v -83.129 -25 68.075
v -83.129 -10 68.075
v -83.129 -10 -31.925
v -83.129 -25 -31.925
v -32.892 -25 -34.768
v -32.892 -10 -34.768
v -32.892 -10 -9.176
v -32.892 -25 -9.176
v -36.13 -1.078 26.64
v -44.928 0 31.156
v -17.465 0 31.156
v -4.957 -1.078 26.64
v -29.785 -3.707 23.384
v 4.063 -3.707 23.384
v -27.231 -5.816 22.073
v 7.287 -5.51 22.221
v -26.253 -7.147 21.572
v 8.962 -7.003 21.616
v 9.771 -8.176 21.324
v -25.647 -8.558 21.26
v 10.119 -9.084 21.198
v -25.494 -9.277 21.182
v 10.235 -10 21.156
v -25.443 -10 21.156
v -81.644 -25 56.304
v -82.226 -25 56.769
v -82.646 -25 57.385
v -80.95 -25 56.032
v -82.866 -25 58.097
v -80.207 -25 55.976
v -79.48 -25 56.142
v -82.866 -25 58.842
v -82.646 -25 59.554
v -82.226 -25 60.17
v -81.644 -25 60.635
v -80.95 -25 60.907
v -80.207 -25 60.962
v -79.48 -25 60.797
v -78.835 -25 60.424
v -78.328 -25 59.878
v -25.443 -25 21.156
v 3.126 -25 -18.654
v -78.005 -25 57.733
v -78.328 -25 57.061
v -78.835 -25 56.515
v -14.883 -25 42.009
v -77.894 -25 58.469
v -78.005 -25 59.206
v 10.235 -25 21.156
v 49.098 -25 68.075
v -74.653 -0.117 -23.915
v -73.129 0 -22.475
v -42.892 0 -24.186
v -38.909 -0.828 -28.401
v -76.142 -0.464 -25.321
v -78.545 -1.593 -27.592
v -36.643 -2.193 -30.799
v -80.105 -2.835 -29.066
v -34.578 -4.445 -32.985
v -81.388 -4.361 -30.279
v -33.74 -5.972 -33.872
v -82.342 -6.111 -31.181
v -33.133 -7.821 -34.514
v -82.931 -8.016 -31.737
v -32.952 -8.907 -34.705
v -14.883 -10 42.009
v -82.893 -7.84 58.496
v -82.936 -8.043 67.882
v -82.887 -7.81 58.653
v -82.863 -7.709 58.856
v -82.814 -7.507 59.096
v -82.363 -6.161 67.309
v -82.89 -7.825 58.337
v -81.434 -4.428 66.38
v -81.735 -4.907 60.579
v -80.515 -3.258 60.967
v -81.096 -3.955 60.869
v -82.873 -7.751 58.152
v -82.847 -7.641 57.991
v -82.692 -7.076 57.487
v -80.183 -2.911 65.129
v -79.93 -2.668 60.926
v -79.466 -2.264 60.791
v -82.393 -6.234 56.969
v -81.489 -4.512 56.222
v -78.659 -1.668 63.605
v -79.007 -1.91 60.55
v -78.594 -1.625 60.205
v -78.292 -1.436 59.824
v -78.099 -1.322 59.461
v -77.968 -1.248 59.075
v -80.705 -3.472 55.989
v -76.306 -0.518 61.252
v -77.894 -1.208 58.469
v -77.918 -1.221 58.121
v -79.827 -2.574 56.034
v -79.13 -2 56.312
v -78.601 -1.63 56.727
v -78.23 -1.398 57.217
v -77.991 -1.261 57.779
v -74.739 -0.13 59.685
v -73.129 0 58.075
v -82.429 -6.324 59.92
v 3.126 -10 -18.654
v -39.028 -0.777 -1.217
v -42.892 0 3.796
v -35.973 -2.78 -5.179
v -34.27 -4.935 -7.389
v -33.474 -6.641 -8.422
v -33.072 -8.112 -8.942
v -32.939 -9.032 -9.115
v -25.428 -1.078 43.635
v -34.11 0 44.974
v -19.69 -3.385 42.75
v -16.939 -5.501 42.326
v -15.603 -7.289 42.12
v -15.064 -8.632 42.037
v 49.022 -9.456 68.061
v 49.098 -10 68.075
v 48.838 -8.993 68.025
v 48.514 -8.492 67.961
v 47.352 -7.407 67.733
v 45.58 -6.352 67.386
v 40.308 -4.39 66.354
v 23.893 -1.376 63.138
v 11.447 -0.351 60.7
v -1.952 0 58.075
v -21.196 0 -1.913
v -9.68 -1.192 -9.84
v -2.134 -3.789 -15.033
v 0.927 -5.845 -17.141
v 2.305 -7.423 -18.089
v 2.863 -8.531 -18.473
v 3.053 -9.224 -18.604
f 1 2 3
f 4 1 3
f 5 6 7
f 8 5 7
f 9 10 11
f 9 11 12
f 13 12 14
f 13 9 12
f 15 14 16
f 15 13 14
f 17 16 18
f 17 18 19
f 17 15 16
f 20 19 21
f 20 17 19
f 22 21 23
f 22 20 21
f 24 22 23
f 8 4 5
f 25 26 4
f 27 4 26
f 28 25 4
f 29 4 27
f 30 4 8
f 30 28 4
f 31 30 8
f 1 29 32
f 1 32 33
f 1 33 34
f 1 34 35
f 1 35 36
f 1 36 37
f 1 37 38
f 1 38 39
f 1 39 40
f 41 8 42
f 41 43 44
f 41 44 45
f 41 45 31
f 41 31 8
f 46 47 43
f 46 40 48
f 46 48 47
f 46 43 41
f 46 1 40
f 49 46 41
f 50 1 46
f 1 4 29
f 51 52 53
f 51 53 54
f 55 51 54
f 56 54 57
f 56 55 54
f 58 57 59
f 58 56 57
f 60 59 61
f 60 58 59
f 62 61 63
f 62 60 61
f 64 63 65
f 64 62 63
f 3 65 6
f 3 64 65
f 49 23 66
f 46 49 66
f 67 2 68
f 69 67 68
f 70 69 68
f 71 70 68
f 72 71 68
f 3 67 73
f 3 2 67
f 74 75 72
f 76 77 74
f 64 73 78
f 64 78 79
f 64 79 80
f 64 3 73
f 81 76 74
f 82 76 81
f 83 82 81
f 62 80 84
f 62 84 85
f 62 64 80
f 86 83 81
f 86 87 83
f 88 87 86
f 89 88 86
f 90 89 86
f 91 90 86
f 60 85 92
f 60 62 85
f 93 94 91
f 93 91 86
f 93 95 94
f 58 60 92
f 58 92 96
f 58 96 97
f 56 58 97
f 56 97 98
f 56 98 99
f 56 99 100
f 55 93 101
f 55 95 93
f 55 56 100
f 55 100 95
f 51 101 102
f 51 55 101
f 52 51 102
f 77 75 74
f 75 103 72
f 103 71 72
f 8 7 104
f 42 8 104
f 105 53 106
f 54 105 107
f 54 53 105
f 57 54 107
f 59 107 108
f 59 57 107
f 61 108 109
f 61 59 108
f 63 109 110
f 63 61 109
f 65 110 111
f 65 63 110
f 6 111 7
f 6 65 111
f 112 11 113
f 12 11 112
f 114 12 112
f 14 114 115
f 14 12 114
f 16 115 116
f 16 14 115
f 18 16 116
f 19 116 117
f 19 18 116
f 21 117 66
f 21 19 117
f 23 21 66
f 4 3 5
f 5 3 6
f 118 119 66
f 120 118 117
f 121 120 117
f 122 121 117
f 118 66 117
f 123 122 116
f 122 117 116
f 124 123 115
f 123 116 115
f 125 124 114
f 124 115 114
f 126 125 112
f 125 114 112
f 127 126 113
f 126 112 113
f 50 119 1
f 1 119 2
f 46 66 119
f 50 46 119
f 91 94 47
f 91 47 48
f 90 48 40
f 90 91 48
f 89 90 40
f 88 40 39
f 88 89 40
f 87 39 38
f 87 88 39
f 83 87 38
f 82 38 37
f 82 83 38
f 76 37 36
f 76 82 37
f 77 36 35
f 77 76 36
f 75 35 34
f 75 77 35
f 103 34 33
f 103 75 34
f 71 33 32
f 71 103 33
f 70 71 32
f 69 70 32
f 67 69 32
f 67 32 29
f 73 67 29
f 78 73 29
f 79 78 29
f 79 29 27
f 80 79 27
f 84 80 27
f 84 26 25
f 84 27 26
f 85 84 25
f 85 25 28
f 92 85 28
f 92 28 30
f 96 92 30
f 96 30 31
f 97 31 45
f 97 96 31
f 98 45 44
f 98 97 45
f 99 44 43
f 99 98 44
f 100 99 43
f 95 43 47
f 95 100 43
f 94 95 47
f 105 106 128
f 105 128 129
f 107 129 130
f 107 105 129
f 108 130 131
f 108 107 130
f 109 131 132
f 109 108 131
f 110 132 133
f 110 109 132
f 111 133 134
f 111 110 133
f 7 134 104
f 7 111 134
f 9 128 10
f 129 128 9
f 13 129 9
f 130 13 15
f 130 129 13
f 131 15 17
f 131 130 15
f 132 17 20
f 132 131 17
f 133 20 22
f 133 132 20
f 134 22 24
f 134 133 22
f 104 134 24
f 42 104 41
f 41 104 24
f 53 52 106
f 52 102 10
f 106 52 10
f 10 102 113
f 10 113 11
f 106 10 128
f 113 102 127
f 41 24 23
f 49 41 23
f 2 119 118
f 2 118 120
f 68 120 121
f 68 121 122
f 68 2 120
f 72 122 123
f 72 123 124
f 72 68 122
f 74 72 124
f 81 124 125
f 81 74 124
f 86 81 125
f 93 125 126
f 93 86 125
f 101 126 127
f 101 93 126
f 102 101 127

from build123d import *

# Parameters (mm, degrees)
F1_DEPTH     = 25
F2_R         = 2.5
F3_DEPTH     = 46.9
F4_T1_DEPTH  = 150
F4_T3_DEPTH  = 182.2274848408
F4_T5_DEPTH  = 100.3173754326
F4_T10_DEPTH = 75.5924176596
F4_T15_DEPTH = 87.245278787
F4_T20_DEPTH = 99.0010747165
F4_T25_DEPTH = 85.6788355908
F4_T30_DEPTH = 82.646426835
F4_T35_DEPTH = 119.0871070802
F4_T41_DEPTH = 75.5924176596
F4_T45_DEPTH = 87.245278787
F4_T52_DEPTH = 85.6788355908
F4_T56_DEPTH = 99.0010747165
F4_T63_DEPTH = 119.0871070802
F4_T67_DEPTH = 82.646426835


# Not quite as in the source:
# - a fillet or chamfer that OpenCascade refuses, or shapes differently, is made with other operations: its cross-section is extruded or revolved along the edge and cut away or added


with BuildPart() as f1:
    # F0 (on Front) → F1 (new body)
    with BuildSketch(Plane.XZ):
        Polygon((49.0980417262, 68.0754659733), (-83.1294431146, 68.0754659733), (-83.1294431146, -31.9245340267), (-32.8924826343, -34.7681359889), (-32.8924826343, -9.1757183293), (3.1264783981, -18.6543911301), (-25.4433550304, 21.1560339021), (10.2354805604, 21.1560339021), (-14.8830008989, 42.00911699), align=None)
    extrude(amount=F1_DEPTH)

    # F2 (on Front) → F3 (cut)
    with BuildSketch(Plane.XZ):
        with Locations((-80.3935006261, 58.4694631398)):
            Circle(F2_R)
    extrude(amount=F3_DEPTH, mode=Mode.SUBTRACT)

    # F4: fillet of radius 10 on 9 edges, made by hand

    # F4_s2 → F4_t1 (cut)
    with BuildSketch(Plane.XY.offset(-56.9245340267)):
        with BuildLine():
            ThreePointArc((-83.1294431146, -10), (-80.2005109264, -2.9289321881), (-73.1294431146, 0))
            Line((-73.1294431146, 0), (-83.1294431146, 0))
            Line((-83.1294431146, 0), (-83.1294431146, -10))
        make_face()
    extrude(amount=F4_T1_DEPTH, mode=Mode.SUBTRACT)

    # F4_s4 → F4_t3 (cut)
    with BuildSketch(Plane.YZ.offset(-108.1294431146)):
        with BuildLine():
            ThreePointArc((-10, 68.0754659733), (-2.9289321881, 65.1465337851), (0, 58.0754659733))
            Line((0, 58.0754659733), (0, 68.0754659733))
            Line((0, 68.0754659733), (-10, 68.0754659733))
        make_face()
    extrude(amount=F4_T3_DEPTH, mode=Mode.SUBTRACT)

    # F4_s6 → F4_t5 (cut)
    with BuildSketch(Plane(origin=(-106.0227160465, 0, 6.0012867121), x_dir=(0, 1, 0), z_dir=(0.9984018453, 0, -0.0565133205))):
        with BuildLine():
            ThreePointArc((0, -26.5714345391), (-2.9289321881, -33.6425023509), (-10, -36.5714345391))
            Line((-10, -36.5714345391), (0, -36.5714345391))
            Line((0, -36.5714345391), (0, -26.5714345391))
        make_face()
    extrude(amount=F4_T5_DEPTH, mode=Mode.SUBTRACT)


with BuildPart() as f4_tool8:
    # F4_s9 → F4_t10 (new body)
    with BuildSketch(Plane.XY.offset(-59.7681359889)):
        with BuildLine():
            ThreePointArc((-42.8924826343, 0), (-35.8214148224, -2.9289321881), (-32.8924826343, -10))
            Line((-32.8924826343, -10), (-32.8924826343, 0))
            Line((-32.8924826343, 0), (-42.8924826343, 0))
        make_face()
    extrude(amount=F4_T10_DEPTH)

    split(bisect_by=Plane(origin=(-4.3886140602, 0, -16.676735461), x_dir=(0, 1, 0), z_dir=(-0.2544932703, 0, -0.9670745449)), keep=Keep.TOP)


with BuildPart() as f1_1:
    add(f1.part)

    # F4_t7: cut F4_tool8
    add(f4_tool8.part, mode=Mode.SUBTRACT)


with BuildPart() as f4_tool13:
    # F4_s14 → F4_t15 (new body)
    with BuildSketch(Plane(origin=(-52.6807321964, 0, 13.8633488887), x_dir=(0, 1, 0), z_dir=(0.9670745449, 0, -0.2544932703))):
        with BuildLine():
            ThreePointArc((0, -7.2445191005), (-2.9289321881, -14.3155869123), (-10, -17.2445191005))
            Line((-10, -17.2445191005), (0, -17.2445191005))
            Line((0, -17.2445191005), (0, -7.2445191005))
        make_face()
    extrude(amount=F4_T15_DEPTH)

    split(bisect_by=Plane.YZ.offset(-32.8924826343), keep=Keep.TOP)


with BuildPart() as f1_2:
    add(f1_1.part)

    # F4_t12: cut F4_tool13
    add(f4_tool13.part, mode=Mode.SUBTRACT)


with BuildPart() as f4_tool18:
    # F4_s19 → F4_t20 (new body)
    with BuildSketch(Plane(origin=(24.4753258646, 0, -34.1049634717), x_dir=(0, 1, 0), z_dir=(-0.5830450371, 0, 0.8124398345))):
        with BuildLine():
            ThreePointArc((0, 18.3362745772), (-2.9289321881, 11.2652067653), (-10, 8.3362745772))
            Line((-10, 8.3362745772), (0, 8.3362745772))
            Line((0, 8.3362745772), (0, 18.3362745772))
        make_face()
    extrude(amount=F4_T20_DEPTH)

    split(bisect_by=Plane.XY.offset(21.1560339021), keep=Keep.BOTTOM)


with BuildPart() as f1_3:
    add(f1_2.part)

    # F4_t17: cut F4_tool18
    add(f4_tool18.part, mode=Mode.SUBTRACT)


with BuildPart() as f4_tool23:
    # F4_s24 → F4_t25 (new body)
    with BuildSketch(Plane.YZ.offset(-50.4433550304)):
        with BuildLine():
            ThreePointArc((0, 31.1560339021), (-2.9289321881, 24.0849660902), (-10, 21.1560339021))
            Line((-10, 21.1560339021), (0, 21.1560339021))
            Line((0, 21.1560339021), (0, 31.1560339021))
        make_face()
    extrude(amount=F4_T25_DEPTH)

    split(bisect_by=Plane(origin=(-6.7727215377, 0, -4.8604235206), x_dir=(0, 1, 0), z_dir=(0.8124398345, 0, 0.5830450371)), keep=Keep.TOP)


with BuildPart() as f1_4:
    add(f1_3.part)

    # F4_t22: cut F4_tool23
    add(f4_tool23.part, mode=Mode.SUBTRACT)


with BuildPart() as f4_tool28:
    # F4_s29 → F4_t30 (new body)
    with BuildSketch(Plane(origin=(14.897118547, 0, -12.3674216268), x_dir=(0, 1, 0), z_dir=(-0.769409822, 0, 0.6387554507))):
        with BuildLine():
            ThreePointArc((0, -12.8156292772), (-2.9289321881, -19.8866970891), (-10, -22.8156292772))
            Line((-10, -22.8156292772), (0, -22.8156292772))
            Line((0, -22.8156292772), (0, -12.8156292772))
        make_face()
    extrude(amount=F4_T30_DEPTH)

    split(bisect_by=Plane(origin=(-16.7971177223, 0, 41.2292916688), x_dir=(0, 1, 0), z_dir=(0.377296866, 0, -0.9260923684)), keep=Keep.TOP)


with BuildPart() as f1_5:
    add(f1_4.part)

    # F4_t27: cut F4_tool28
    add(f4_tool28.part, mode=Mode.SUBTRACT)


with BuildPart() as f4_tool33:
    # F4_s34 → F4_t35 (new body)
    with BuildSketch(Plane(origin=(-21.2381923878, 0, -8.6525963291), x_dir=(0, 1, 0), z_dir=(0.9260923684, 0, 0.377296866))):
        with BuildLine():
            ThreePointArc((-10, 44.5196322457), (-2.9289321881, 47.4485644338), (0, 54.5196322457))
            Line((0, 54.5196322457), (0, 44.5196322457))
            Line((0, 44.5196322457), (-10, 44.5196322457))
        make_face()
    extrude(amount=F4_T35_DEPTH)

    split(bisect_by=Plane(origin=(14.5736075628, 0, 17.5545692605), x_dir=(0, 1, 0), z_dir=(0.6387554507, 0, 0.769409822)), keep=Keep.TOP)


with BuildPart() as f1_6:
    add(f1_5.part)

    # F4_t32: cut F4_tool33
    add(f4_tool33.part, mode=Mode.SUBTRACT)


with BuildPart() as f4_tool39:
    # F4_s40 → F4_t41 (new body)
    with BuildSketch(Plane.XY.offset(-59.7681359889)):
        with BuildLine():
            ThreePointArc((-42.8924826343, 0), (-35.8214148224, -2.9289321881), (-32.8924826343, -10))
            Line((-32.8924826343, -10), (-32.8924826343, 0))
            Line((-32.8924826343, 0), (-42.8924826343, 0))
        make_face()
    extrude(amount=F4_T41_DEPTH)

    split(bisect_by=Plane(origin=(-4.3886140602, 0, -16.676735461), x_dir=(0, 1, 0), z_dir=(0.2544932703, 0, 0.9670745449)), keep=Keep.TOP)


with BuildPart() as f4_tool43:
    # F4_s44 → F4_t45 (new body)
    with BuildSketch(Plane(origin=(-52.6807321964, 0, 13.8633488887), x_dir=(0, 1, 0), z_dir=(0.9670745449, 0, -0.2544932703))):
        with BuildLine():
            ThreePointArc((0, -7.2445191005), (-2.9289321881, -14.3155869123), (-10, -17.2445191005))
            Line((-10, -17.2445191005), (0, -17.2445191005))
            Line((0, -17.2445191005), (0, -7.2445191005))
        make_face()
    extrude(amount=F4_T45_DEPTH)

    split(bisect_by=Plane.YZ.offset(-32.8924826343), keep=Keep.BOTTOM)


with BuildPart() as f4_tool39_1:
    add(f4_tool39.part)

    # F4_t47: intersect F4_tool43
    add(f4_tool43.part, mode=Mode.INTERSECT)


with BuildPart() as f1_7:
    add(f1_6.part)

    # F4_t37: cut F4_tool39
    add(f4_tool39_1.part, mode=Mode.SUBTRACT)


with BuildPart() as f4_tool50:
    # F4_s51 → F4_t52 (new body)
    with BuildSketch(Plane.YZ.offset(-50.4433550304)):
        with BuildLine():
            ThreePointArc((0, 31.1560339021), (-2.9289321881, 24.0849660902), (-10, 21.1560339021))
            Line((-10, 21.1560339021), (0, 21.1560339021))
            Line((0, 21.1560339021), (0, 31.1560339021))
        make_face()
    extrude(amount=F4_T52_DEPTH)

    split(bisect_by=Plane(origin=(-6.7727215377, 0, -4.8604235206), x_dir=(0, 1, 0), z_dir=(-0.8124398345, 0, -0.5830450371)), keep=Keep.TOP)


with BuildPart() as f4_tool54:
    # F4_s55 → F4_t56 (new body)
    with BuildSketch(Plane(origin=(24.4753258646, 0, -34.1049634717), x_dir=(0, 1, 0), z_dir=(-0.5830450371, 0, 0.8124398345))):
        with BuildLine():
            ThreePointArc((0, 18.3362745772), (-2.9289321881, 11.2652067653), (-10, 8.3362745772))
            Line((-10, 8.3362745772), (0, 8.3362745772))
            Line((0, 8.3362745772), (0, 18.3362745772))
        make_face()
    extrude(amount=F4_T56_DEPTH)

    split(bisect_by=Plane.XY.offset(21.1560339021), keep=Keep.TOP)


with BuildPart() as f4_tool50_1:
    add(f4_tool50.part)

    # F4_t58: intersect F4_tool54
    add(f4_tool54.part, mode=Mode.INTERSECT)


with BuildPart() as f1_8:
    add(f1_7.part)

    # F4_t48: cut F4_tool50
    add(f4_tool50_1.part, mode=Mode.SUBTRACT)


with BuildPart() as f4_tool61:
    # F4_s62 → F4_t63 (new body)
    with BuildSketch(Plane(origin=(-21.2381923878, 0, -8.6525963291), x_dir=(0, 1, 0), z_dir=(0.9260923684, 0, 0.377296866))):
        with BuildLine():
            ThreePointArc((-10, 44.5196322457), (-2.9289321881, 47.4485644338), (0, 54.5196322457))
            Line((0, 54.5196322457), (0, 44.5196322457))
            Line((0, 44.5196322457), (-10, 44.5196322457))
        make_face()
    extrude(amount=F4_T63_DEPTH)

    split(bisect_by=Plane(origin=(14.5736075628, 0, 17.5545692605), x_dir=(0, 1, 0), z_dir=(-0.6387554507, 0, -0.769409822)), keep=Keep.TOP)


with BuildPart() as f4_tool65:
    # F4_s66 → F4_t67 (new body)
    with BuildSketch(Plane(origin=(14.897118547, 0, -12.3674216268), x_dir=(0, 1, 0), z_dir=(-0.769409822, 0, 0.6387554507))):
        with BuildLine():
            ThreePointArc((0, -12.8156292772), (-2.9289321881, -19.8866970891), (-10, -22.8156292772))
            Line((-10, -22.8156292772), (0, -22.8156292772))
            Line((0, -22.8156292772), (0, -12.8156292772))
        make_face()
    extrude(amount=F4_T67_DEPTH)

    split(bisect_by=Plane(origin=(-16.7971177223, 0, 41.2292916688), x_dir=(0, 1, 0), z_dir=(-0.377296866, 0, 0.9260923684)), keep=Keep.TOP)


with BuildPart() as f4_tool61_1:
    add(f4_tool61.part)

    # F4_t69: intersect F4_tool65
    add(f4_tool65.part, mode=Mode.INTERSECT)


with BuildPart() as f1_9:
    add(f1_8.part)

    # F4_t59: cut F4_tool61
    add(f4_tool61_1.part, mode=Mode.SUBTRACT)


solid = f1_9.part
